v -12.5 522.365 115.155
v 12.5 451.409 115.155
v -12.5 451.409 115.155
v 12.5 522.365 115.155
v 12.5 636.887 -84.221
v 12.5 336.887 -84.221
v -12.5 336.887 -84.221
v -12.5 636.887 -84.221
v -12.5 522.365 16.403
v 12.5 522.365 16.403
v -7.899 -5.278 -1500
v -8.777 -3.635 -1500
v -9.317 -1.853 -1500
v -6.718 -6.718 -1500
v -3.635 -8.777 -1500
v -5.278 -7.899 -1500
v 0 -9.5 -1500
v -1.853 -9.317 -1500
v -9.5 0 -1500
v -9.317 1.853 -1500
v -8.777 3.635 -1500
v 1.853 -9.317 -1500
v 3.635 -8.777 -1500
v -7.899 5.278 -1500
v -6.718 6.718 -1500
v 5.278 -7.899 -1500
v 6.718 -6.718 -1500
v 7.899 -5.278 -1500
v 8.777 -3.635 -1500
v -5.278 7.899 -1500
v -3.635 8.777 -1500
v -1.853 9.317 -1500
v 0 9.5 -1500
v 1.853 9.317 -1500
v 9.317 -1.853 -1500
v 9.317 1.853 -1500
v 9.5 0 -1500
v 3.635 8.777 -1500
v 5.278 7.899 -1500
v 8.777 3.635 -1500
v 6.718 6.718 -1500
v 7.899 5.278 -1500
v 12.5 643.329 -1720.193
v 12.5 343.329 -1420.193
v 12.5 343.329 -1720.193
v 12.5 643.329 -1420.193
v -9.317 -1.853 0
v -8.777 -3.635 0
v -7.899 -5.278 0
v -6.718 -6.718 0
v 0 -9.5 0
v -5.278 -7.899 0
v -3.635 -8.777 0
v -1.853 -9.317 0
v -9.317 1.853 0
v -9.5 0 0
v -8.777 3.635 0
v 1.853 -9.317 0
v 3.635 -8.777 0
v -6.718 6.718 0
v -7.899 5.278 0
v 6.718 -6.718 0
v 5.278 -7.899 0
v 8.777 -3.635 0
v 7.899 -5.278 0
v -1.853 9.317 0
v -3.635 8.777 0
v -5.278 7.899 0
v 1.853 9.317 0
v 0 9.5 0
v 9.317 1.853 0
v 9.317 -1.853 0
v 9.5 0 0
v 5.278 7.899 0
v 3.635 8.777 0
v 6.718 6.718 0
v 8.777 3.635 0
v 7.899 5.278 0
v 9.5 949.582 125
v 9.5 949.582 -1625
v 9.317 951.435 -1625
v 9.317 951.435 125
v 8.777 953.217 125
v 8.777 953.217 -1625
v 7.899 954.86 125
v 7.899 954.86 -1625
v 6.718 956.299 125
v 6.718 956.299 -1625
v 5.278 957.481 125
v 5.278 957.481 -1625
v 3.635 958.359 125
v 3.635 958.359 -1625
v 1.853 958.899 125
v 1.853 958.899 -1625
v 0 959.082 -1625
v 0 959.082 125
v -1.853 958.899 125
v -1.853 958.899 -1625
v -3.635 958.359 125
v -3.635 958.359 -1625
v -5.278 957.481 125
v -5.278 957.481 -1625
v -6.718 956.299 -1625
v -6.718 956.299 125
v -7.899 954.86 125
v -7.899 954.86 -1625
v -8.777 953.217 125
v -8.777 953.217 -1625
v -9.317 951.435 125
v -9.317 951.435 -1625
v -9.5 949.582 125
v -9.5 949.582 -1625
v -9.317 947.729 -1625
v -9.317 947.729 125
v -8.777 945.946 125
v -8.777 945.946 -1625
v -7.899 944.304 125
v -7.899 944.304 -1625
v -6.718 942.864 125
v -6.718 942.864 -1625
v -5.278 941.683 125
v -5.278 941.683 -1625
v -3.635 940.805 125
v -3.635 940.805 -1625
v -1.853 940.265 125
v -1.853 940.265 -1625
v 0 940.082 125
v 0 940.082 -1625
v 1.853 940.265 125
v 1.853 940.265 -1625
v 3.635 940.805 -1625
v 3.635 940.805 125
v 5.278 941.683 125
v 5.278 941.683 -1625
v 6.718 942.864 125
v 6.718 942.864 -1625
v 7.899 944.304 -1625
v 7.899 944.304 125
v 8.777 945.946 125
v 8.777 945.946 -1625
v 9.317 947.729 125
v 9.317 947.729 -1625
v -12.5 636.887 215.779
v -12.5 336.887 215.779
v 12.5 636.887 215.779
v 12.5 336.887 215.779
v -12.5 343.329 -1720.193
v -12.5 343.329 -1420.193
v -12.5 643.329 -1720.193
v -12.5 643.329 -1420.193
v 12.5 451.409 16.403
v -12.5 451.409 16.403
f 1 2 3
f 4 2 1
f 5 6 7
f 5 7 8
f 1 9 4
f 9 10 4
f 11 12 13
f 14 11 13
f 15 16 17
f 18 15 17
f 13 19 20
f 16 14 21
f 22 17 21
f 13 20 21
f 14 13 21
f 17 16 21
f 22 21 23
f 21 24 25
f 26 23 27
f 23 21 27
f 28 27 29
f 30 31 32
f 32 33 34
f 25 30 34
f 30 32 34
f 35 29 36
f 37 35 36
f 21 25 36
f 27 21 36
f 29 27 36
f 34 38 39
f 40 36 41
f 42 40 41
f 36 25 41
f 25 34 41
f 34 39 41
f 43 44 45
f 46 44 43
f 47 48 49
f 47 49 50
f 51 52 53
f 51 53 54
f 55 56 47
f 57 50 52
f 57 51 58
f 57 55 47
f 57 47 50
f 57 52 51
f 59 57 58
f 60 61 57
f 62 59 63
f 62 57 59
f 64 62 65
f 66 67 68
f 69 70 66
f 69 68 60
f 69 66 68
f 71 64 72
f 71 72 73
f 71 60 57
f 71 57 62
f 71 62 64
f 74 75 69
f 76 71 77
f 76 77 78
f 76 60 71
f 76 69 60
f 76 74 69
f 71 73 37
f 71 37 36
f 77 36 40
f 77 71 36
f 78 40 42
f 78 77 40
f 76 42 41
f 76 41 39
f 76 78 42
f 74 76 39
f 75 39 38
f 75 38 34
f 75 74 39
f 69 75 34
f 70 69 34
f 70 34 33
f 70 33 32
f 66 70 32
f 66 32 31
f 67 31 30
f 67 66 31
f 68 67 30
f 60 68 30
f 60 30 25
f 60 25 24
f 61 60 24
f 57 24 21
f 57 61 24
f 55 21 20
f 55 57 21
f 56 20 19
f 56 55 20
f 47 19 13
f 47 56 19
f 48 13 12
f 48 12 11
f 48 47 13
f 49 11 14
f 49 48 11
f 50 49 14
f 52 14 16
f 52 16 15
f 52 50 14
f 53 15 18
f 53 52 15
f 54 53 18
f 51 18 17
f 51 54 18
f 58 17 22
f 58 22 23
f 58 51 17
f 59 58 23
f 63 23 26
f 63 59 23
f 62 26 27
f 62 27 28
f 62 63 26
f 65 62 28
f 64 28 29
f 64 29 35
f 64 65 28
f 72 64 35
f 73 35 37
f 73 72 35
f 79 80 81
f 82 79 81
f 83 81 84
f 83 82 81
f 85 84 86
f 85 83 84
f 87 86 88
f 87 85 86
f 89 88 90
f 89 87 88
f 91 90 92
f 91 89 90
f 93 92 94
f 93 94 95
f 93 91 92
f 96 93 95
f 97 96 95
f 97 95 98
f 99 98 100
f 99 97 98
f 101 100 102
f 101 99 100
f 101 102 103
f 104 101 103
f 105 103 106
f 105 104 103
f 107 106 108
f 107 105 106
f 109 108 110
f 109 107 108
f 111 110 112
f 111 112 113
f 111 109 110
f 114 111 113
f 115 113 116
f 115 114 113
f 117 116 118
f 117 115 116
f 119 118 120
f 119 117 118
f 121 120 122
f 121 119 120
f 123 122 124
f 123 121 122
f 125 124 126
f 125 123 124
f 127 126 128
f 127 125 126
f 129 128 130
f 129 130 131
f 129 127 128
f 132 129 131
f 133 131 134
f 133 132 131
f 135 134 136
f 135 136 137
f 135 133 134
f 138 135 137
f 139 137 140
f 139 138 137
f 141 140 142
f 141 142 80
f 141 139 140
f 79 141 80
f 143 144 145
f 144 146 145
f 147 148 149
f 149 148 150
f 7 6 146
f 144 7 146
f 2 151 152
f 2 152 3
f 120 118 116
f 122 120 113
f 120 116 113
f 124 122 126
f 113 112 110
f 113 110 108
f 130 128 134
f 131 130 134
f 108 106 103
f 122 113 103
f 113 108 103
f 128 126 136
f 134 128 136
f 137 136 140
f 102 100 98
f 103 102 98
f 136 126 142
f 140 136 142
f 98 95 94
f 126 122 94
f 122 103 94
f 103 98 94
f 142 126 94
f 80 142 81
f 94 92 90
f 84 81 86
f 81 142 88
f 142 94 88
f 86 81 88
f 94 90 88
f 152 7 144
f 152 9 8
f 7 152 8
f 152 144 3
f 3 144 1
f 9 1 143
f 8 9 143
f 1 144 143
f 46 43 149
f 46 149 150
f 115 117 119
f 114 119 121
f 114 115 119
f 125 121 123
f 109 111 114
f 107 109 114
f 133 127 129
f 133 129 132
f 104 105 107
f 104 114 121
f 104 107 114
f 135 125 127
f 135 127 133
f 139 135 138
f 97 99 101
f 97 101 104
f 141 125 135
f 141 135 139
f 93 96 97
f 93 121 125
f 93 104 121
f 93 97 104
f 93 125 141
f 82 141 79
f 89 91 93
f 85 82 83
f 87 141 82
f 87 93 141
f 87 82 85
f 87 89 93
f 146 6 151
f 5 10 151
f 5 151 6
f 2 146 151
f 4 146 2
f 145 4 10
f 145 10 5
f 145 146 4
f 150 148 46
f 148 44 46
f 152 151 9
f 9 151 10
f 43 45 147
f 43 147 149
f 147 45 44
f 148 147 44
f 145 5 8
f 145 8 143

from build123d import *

# Parameters (mm, degrees)
F2_R      = 9.5
F3_DEPTH  = 1500
F9_R      = 9.5
F10_DEPTH = 1750
F13_W     = 300
F13_H     = 300
F13_W_2   = 70.9563016891
F13_H_2   = 98.7522929907
F14_DEPTH = 12.5
F15_W     = 300
F15_H     = 300
F16_DEPTH = 12.5


# Not quite as in the source:
# - the program builds the solid bodies; features that only make, move or delete a surface that nothing else refers to are left out


with BuildPart() as f3:
    # F2 (on Top) → F3 (new body)
    with BuildSketch(Plane.XY):
        Circle(F2_R)
    extrude(amount=-F3_DEPTH)


with BuildPart() as f10:
    # F9 (on offset) → F10 (new body)
    with BuildSketch(Plane.XY.offset(125)):
        with Locations((0, 949.5819807053)):
            Circle(F9_R)
    extrude(amount=-F10_DEPTH)


with BuildPart() as f14:
    # F13 (on Right) → F14 (new body, symmetric)
    with BuildSketch(Plane.YZ):
        with Locations((486.8869185448, 65.7790899277)):
            Rectangle(F13_W, F13_H)
        with Locations((486.8869185448, 65.7790899277)):
            Rectangle(F13_W_2, F13_H_2, mode=Mode.SUBTRACT)
    extrude(amount=F14_DEPTH, both=True)


with BuildPart() as f16:
    # F15 (on Right) → F16 (new body, symmetric)
    with BuildSketch(Plane.YZ):
        with Locations((493.3289289474, -1570.1934099197)):
            Rectangle(F15_W, F15_H)
    extrude(amount=F16_DEPTH, both=True)


solid = Compound([f3.part, f10.part, f14.part, f16.part])
